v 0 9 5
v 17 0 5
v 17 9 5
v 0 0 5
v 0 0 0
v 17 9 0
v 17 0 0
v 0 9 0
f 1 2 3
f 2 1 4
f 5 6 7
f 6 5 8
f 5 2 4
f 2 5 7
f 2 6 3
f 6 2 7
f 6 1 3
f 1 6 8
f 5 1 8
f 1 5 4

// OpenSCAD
// Generated by SolidPython 1.0.1 on 2020-07-29 00:46:56


cube(size = [17, 9, 5]);
/***********************************************
*********      SolidPython code:      **********
************************************************
 
# import packages: SolidPython
from solid import *
from solid.utils import *
from itertools import chain, combinations, permutations


class Resize:

    def __init__(self, scad_file):
        self.scad_file = scad_file
        #self.scad_file = import_scad(scad_file)
        # cone/cylinder param:
        self.r1 = 0
        self.r2 = 0
        self.h = 0
        # rectangular prism param:
        self.w = 0
        self.l = 0
        # ellipse param:
        self.r = 0

    # import OpenScad code (file name corresponds to shape)


    # classify shape + parameters
    def assign(self, param1, param2, param3):
        if self.scad_file == 'cone.scad':
            self.r1 = param1
            self.r2 = param2
            self.h = param3
        elif self.scad_file == 'cylinder.scad':
            self.r1 = param1
            self.r2 = param2
            self.h = param3
        elif self.scad_file == 'rectangularPrism.scad':
            self.h = param1
            self.l = param2
            self.w = param3
        else:
            self.r = param1
            self.h = param2

    # resize parameters
    def iterate(self):
        x = range(3, 20, 2)
        i = 1
        if self.scad_file == 'cone.scad':
            tempList = list(permutations(x, 2))
            for temp in tempList:
                param1 = temp[0]
                param2 = temp[1]
                filepath = 'produced_scad_files/' + 'cone' + str(param1) + '_' + str(param2) + '_' + '.scad'
                scad_render_to_file(cylinder(h=param1, r1=param2, r2=0), filepath)

        elif self.scad_file == 'cylinder.scad':
            tempList = list(permutations(x, 3))
            for temp in tempList:
                param1 = temp[0]
                param2 = temp[1]
                filepath = 'produced_scad_files/' + 'cylinder' + str(param1) + '_' + str(param2) + '_' + '.scad'
                scad_render_to_file(cylinder(h=param1, r1=param2, r2=param2), filepath)

        elif self.scad_file == 'rectangularPrism.scad':
            tempList = list(permutations(x, 3))
            for temp in tempList:
                param1 = temp[0]
                param2 = temp[1]
                param3 = temp[2]
                filepath = 'produced_scad_files/' + 'rectangularPrism' + str(param1) + '_' + str(param2) + '_' + str(
                    param3) + '.scad'
                scad_render_to_file(cube(size=(param1, param2, param3)), filepath)

        elif self.scad_file == 'ellipse.scad':
            tempList = list(permutations(x, 4))
            for temp in tempList:
                param1 = temp[0]
                param2 = temp[1]
                param3 = temp[2]
                param4 = temp[3]
                filepath = 'produced_scad_files/' + 'ellipse' + str(param1) + '_' + str(param2) + '_' + str(param3) + '_' + str(param4) + '.scad'
                scad_render_to_file(scale([param1, param2, param3])(sphere(r=param4)), filepath)

    def render_to_scadfile(self):
        scad_render_to_file(scad, 'example.scad') 
 
************************************************/
